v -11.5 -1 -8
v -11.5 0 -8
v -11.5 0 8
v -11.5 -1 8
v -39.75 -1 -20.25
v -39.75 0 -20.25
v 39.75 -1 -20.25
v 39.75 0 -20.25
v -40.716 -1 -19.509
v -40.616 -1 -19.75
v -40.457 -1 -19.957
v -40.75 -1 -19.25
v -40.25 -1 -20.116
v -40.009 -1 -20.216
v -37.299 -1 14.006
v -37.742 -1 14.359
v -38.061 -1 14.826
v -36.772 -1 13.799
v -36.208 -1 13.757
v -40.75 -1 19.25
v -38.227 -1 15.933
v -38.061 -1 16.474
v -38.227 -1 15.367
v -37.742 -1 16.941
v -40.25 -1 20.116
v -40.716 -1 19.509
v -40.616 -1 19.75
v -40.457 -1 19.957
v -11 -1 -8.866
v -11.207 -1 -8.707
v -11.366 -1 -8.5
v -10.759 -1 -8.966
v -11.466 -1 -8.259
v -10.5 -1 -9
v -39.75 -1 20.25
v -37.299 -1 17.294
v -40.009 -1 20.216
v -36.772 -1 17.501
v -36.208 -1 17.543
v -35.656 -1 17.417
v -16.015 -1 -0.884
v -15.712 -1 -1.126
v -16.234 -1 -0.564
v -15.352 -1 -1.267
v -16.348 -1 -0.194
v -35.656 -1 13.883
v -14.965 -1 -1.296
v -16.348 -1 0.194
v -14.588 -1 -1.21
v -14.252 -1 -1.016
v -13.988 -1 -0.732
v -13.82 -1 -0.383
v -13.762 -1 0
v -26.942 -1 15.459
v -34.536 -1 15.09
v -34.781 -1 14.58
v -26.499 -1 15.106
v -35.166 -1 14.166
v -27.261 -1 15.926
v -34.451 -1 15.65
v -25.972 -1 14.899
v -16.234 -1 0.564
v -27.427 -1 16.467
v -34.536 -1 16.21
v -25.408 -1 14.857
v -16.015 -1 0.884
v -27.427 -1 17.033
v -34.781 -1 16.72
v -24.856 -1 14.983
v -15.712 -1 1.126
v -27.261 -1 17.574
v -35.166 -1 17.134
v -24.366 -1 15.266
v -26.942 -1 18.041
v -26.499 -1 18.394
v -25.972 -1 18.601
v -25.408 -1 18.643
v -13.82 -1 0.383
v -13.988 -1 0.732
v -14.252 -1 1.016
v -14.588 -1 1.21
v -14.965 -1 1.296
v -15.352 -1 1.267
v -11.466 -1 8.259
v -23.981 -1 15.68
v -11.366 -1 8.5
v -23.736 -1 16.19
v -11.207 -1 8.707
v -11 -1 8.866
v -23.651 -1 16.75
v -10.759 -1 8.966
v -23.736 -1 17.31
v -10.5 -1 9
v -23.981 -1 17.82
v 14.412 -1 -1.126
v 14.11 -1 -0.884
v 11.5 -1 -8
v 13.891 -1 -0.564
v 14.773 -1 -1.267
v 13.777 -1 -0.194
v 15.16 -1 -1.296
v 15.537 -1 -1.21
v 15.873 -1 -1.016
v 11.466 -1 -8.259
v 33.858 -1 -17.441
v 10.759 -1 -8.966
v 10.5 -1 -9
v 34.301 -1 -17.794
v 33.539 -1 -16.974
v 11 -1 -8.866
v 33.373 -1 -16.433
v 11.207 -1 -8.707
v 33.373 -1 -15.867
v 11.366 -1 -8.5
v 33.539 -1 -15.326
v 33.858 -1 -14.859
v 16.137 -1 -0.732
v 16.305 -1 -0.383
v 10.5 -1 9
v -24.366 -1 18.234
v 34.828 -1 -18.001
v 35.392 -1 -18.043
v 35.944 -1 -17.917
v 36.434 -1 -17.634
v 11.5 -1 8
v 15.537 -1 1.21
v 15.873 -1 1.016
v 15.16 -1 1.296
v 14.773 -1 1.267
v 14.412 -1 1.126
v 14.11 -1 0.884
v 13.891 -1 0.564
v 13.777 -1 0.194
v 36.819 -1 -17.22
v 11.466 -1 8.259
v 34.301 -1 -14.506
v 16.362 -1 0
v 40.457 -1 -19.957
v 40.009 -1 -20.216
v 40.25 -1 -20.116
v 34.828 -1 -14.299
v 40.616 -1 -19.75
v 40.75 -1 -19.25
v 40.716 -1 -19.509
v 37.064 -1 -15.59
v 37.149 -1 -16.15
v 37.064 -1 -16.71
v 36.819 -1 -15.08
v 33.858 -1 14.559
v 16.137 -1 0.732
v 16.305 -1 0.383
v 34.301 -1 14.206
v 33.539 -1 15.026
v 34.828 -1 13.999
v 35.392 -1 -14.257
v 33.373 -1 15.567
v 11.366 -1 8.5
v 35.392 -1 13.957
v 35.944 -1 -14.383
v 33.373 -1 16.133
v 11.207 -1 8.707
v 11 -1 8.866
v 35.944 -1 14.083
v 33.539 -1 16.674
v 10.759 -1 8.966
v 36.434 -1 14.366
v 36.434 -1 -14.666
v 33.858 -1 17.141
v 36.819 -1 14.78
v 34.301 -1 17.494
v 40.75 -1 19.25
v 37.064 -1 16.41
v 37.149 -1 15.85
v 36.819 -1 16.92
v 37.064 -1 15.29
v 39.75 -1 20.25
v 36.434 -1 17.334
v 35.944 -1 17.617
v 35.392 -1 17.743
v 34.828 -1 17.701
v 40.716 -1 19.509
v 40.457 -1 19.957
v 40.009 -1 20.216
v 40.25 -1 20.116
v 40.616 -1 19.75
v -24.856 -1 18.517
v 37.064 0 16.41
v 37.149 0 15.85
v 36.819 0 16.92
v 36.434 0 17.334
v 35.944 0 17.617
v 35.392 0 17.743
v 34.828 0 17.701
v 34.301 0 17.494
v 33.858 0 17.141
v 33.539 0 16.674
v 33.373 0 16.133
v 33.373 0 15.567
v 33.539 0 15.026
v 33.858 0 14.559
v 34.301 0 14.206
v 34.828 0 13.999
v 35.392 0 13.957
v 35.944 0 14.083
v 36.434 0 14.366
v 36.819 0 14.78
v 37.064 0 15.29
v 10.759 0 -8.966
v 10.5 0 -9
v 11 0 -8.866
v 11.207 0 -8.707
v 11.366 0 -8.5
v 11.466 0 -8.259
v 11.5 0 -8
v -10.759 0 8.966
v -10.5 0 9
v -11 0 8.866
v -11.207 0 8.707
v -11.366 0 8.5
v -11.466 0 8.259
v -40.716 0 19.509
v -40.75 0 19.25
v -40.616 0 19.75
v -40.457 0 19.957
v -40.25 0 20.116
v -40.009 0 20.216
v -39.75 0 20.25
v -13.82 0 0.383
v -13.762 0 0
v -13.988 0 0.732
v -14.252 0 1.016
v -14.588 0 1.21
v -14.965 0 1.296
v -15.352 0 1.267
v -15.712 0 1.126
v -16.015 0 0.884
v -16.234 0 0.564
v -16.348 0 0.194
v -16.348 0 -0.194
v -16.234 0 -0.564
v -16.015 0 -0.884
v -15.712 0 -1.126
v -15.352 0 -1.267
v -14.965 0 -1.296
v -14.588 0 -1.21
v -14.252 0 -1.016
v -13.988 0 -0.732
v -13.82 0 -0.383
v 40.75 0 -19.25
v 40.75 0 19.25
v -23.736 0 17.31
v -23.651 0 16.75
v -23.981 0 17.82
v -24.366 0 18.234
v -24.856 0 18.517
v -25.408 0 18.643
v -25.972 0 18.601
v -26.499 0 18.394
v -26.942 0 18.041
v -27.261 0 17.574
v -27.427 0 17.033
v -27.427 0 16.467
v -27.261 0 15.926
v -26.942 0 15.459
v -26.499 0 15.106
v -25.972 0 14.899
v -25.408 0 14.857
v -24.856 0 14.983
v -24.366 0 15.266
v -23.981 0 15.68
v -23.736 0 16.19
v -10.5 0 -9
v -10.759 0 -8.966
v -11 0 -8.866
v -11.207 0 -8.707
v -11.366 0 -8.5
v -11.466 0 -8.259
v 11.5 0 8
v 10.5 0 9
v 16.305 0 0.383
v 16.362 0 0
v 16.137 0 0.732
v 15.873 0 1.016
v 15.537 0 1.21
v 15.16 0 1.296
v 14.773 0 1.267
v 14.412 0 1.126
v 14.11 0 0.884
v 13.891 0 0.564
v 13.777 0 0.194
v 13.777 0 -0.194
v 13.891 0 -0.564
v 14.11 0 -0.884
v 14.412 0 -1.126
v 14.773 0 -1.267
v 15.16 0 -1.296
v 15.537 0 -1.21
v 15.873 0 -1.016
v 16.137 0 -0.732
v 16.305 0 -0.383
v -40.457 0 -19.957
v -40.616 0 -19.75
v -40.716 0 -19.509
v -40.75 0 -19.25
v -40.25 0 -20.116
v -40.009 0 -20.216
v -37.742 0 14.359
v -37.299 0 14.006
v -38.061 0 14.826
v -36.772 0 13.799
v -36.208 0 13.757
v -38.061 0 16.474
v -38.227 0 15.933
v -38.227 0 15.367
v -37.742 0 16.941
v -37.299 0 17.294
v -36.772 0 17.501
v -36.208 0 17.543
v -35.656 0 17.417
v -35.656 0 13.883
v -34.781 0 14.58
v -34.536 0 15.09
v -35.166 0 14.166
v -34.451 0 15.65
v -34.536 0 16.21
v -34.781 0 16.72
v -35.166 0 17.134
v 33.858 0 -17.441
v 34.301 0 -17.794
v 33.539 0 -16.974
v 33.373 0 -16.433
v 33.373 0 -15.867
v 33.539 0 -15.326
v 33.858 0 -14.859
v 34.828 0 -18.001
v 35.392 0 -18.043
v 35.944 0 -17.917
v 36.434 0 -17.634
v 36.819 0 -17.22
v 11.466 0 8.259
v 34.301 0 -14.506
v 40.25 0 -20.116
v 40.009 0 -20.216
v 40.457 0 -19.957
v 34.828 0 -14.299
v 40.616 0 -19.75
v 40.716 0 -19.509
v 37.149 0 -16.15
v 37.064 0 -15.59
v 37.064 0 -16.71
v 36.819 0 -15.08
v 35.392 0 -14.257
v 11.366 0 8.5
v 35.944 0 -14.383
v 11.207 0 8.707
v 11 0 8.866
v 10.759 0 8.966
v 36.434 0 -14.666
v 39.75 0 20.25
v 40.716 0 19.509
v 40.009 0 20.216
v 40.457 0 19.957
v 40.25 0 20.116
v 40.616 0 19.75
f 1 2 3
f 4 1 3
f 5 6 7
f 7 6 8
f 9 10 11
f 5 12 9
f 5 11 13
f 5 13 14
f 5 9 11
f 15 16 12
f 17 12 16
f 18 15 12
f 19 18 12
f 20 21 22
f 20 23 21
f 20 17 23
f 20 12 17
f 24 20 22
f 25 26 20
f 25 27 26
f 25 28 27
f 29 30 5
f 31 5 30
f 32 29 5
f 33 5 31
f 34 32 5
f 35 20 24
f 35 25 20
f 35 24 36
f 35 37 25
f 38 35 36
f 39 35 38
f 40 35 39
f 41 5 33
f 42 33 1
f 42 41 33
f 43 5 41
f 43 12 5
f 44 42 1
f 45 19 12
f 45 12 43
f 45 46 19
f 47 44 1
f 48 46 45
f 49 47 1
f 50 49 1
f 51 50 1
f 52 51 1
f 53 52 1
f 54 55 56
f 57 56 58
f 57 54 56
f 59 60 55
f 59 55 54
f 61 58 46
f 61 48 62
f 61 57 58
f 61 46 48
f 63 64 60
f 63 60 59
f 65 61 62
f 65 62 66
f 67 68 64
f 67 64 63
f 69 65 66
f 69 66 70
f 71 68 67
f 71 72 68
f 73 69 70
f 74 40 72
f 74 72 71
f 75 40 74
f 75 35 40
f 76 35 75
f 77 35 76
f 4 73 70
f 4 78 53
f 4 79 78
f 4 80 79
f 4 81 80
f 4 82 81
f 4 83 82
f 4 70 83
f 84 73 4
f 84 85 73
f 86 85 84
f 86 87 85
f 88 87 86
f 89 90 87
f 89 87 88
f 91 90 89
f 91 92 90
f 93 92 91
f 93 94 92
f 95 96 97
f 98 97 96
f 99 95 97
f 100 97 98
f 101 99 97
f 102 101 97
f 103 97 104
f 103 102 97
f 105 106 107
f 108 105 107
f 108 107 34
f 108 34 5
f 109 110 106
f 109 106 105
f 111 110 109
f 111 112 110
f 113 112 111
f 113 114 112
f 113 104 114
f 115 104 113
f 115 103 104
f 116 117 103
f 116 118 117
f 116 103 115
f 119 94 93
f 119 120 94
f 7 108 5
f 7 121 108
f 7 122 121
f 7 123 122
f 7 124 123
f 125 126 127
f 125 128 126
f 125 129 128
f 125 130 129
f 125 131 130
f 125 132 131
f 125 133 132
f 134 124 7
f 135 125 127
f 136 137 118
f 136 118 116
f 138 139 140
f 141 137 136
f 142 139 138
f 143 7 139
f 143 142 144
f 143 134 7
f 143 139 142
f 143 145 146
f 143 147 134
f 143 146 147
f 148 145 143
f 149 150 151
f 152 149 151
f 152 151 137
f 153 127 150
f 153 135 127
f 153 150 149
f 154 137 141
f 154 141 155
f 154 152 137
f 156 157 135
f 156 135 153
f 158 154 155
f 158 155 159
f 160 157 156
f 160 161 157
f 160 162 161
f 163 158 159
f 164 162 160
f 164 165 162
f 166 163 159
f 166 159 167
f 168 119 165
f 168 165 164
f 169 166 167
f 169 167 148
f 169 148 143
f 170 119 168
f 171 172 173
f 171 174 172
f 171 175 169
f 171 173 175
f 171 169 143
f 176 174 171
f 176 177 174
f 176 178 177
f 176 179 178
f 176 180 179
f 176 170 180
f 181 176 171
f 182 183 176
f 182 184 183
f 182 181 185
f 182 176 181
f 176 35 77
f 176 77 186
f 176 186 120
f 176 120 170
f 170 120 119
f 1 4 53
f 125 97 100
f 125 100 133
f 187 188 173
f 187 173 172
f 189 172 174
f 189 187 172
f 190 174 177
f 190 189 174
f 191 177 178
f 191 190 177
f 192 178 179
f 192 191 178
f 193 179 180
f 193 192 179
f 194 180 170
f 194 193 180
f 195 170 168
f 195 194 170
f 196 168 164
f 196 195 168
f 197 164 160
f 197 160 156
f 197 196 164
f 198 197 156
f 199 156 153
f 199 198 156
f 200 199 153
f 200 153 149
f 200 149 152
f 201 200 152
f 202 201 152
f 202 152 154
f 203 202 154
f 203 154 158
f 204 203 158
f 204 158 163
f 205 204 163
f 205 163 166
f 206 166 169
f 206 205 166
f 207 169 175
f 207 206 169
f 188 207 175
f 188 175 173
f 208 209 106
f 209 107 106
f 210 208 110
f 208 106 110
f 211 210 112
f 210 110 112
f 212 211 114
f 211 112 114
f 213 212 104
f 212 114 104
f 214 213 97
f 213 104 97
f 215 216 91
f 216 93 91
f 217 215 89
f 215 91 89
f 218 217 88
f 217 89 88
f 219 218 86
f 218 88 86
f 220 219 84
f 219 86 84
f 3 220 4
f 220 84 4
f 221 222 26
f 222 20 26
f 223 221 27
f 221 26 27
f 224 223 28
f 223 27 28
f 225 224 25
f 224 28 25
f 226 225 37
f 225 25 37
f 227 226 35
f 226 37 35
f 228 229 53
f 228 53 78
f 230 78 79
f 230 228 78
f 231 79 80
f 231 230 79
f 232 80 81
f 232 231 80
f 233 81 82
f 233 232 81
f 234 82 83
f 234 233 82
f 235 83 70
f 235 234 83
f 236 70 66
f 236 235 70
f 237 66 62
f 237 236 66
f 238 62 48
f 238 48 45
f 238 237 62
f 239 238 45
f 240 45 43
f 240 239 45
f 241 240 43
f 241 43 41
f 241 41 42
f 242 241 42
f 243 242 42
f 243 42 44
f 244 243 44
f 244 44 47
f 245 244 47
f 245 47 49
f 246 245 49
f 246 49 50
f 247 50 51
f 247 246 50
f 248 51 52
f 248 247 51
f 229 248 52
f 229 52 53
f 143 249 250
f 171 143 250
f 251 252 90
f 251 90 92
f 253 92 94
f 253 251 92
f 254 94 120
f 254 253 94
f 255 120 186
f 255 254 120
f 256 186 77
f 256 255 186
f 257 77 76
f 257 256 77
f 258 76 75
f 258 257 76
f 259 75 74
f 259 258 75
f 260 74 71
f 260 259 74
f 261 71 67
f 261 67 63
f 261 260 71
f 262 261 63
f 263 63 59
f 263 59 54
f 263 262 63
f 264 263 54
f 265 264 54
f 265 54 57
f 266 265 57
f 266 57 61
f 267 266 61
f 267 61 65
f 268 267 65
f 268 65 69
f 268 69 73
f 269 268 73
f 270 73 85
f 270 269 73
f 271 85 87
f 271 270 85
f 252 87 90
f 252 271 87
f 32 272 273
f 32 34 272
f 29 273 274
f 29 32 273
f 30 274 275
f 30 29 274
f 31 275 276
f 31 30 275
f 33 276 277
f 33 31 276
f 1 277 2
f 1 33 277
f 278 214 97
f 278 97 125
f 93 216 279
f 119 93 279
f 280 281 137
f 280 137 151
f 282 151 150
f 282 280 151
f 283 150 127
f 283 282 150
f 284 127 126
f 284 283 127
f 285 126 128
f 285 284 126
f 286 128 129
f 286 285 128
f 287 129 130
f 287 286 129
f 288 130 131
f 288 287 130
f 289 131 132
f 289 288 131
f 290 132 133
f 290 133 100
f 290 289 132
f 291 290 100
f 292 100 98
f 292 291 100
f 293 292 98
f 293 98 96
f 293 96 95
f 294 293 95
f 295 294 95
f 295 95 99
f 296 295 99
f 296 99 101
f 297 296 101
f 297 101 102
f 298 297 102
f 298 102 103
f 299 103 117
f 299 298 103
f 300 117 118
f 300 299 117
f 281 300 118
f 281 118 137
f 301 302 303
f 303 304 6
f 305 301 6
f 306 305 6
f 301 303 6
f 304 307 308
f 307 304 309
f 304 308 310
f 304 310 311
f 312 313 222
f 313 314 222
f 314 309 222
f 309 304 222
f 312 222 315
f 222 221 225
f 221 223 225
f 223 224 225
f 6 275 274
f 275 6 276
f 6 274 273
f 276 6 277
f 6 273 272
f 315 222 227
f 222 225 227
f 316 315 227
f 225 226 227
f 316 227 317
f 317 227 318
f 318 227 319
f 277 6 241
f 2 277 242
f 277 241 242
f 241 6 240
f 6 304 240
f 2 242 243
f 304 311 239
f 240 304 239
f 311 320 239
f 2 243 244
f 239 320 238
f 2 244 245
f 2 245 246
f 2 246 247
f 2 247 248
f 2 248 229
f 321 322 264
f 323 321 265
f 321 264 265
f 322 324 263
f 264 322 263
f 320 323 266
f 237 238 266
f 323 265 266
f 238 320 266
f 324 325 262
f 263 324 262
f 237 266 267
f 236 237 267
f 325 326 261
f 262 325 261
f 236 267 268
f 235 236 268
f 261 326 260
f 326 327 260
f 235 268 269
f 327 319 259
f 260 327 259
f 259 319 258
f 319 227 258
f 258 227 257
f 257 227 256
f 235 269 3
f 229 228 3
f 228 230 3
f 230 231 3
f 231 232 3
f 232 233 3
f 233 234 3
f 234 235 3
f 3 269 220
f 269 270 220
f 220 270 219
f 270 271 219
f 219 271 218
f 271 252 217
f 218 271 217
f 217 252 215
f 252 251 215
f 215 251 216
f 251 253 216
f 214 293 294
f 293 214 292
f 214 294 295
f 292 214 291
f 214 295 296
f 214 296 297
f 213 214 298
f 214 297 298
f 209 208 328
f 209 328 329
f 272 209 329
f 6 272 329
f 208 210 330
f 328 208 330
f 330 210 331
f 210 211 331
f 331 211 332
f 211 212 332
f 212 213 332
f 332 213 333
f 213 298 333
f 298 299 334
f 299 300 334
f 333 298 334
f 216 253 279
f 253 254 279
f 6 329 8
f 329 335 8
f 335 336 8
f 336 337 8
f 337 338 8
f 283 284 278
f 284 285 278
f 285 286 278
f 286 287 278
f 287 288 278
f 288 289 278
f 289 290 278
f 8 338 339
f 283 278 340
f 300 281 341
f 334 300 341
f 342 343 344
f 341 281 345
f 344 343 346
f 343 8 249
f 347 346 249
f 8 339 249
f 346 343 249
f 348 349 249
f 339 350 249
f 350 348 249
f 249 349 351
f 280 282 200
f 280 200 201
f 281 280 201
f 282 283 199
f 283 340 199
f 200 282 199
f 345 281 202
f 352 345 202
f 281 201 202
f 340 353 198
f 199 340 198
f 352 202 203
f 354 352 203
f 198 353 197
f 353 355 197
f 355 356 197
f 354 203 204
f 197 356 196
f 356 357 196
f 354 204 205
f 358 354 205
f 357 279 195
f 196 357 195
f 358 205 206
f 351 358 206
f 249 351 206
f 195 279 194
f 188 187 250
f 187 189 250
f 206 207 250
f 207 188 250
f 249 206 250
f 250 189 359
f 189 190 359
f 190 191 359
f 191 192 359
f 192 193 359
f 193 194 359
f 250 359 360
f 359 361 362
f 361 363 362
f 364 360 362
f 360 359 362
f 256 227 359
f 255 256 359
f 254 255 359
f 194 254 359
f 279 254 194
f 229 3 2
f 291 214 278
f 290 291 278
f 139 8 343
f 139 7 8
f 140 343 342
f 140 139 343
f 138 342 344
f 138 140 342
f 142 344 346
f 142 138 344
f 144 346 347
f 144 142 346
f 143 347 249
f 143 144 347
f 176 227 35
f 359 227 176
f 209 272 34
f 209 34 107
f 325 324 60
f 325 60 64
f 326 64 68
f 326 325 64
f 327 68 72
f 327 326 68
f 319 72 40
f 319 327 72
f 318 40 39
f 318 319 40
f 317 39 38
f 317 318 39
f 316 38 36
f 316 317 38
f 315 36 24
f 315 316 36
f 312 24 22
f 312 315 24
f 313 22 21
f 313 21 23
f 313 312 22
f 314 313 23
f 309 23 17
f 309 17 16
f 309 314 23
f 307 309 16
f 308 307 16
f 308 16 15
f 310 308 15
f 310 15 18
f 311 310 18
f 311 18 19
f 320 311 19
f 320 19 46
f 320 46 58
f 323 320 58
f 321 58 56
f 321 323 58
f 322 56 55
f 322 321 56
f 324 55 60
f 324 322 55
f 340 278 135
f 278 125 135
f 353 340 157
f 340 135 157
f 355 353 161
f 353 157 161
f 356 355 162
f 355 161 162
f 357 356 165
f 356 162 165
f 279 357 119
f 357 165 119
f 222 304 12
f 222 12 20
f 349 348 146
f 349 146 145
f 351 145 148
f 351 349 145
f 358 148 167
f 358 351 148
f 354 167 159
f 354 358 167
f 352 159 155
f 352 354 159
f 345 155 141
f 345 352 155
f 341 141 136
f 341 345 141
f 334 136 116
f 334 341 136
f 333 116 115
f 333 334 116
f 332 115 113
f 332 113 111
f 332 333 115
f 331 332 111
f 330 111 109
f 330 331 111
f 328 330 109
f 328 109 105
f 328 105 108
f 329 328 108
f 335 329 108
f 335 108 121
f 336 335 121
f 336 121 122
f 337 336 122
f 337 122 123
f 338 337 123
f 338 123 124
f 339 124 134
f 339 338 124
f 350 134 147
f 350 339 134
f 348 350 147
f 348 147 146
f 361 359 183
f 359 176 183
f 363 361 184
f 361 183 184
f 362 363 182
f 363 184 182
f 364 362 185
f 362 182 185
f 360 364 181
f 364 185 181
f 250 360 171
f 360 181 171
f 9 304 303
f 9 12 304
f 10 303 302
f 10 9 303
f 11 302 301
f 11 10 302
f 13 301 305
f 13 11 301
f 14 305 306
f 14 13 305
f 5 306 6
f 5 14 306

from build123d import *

# Parameters (mm, degrees)
SKETCH_W                  = 81.5
SKETCH_H                  = 40.5
SKETCH_R                  = 1.89865
SKETCH_R_2                = 1.3
SKETCH_W_2                = 23
SKETCH_H_2                = 18
EXTRUDE001_DEPTH          = 1
FILLET_R                  = 1
FILLET001_R               = 1
FILLET001_PLACEMENT_ANGLE = 90


with BuildPart() as part:
    # Sketch → Extrude001 (new body)
    with BuildSketch(Plane.XY):
        Rectangle(SKETCH_W, SKETCH_H)
        with Locations((-36.35, 15.65)):
            Circle(SKETCH_R, mode=Mode.SUBTRACT)
        with Locations((-25.55, 16.75)):
            Circle(SKETCH_R, mode=Mode.SUBTRACT)
        with Locations((35.25, -16.15)):
            Circle(SKETCH_R, mode=Mode.SUBTRACT)
        with Locations((35.25, 15.85)):
            Circle(SKETCH_R, mode=Mode.SUBTRACT)
        with Locations((-15.0625, 0)):
            Circle(SKETCH_R_2, mode=Mode.SUBTRACT)
        with Locations((15.0625, 0)):
            Circle(SKETCH_R_2, mode=Mode.SUBTRACT)
        Rectangle(SKETCH_W_2, SKETCH_H_2, mode=Mode.SUBTRACT)
    extrude(amount=EXTRUDE001_DEPTH)

    # Fillet
    fillet_edges = [part.edges().sort_by_distance(p)[0] for p in [
        (-40.75, 20.25, 0.5),
        (40.75, 20.25, 0.5),
        (40.75, -20.25, 0.5),
        (-40.75, -20.25, 0.5),
    ]]
    fillet(fillet_edges, radius=FILLET_R)

    # Fillet001
    fillet001_edges = [part.edges().sort_by_distance(p)[0] for p in [
        (-11.5, 9, 0.5),
        (11.5, 9, 0.5),
        (11.5, -9, 0.5),
        (-11.5, -9, 0.5),
    ]]
    fillet(fillet001_edges, radius=FILLET001_R)


with BuildPart() as part_1:
    # Fillet001 placement: moved
    add(part.part.rotate(Axis((0, 0, 0), (1, 0, 0)), FILLET001_PLACEMENT_ANGLE))


solid = part_1.part
